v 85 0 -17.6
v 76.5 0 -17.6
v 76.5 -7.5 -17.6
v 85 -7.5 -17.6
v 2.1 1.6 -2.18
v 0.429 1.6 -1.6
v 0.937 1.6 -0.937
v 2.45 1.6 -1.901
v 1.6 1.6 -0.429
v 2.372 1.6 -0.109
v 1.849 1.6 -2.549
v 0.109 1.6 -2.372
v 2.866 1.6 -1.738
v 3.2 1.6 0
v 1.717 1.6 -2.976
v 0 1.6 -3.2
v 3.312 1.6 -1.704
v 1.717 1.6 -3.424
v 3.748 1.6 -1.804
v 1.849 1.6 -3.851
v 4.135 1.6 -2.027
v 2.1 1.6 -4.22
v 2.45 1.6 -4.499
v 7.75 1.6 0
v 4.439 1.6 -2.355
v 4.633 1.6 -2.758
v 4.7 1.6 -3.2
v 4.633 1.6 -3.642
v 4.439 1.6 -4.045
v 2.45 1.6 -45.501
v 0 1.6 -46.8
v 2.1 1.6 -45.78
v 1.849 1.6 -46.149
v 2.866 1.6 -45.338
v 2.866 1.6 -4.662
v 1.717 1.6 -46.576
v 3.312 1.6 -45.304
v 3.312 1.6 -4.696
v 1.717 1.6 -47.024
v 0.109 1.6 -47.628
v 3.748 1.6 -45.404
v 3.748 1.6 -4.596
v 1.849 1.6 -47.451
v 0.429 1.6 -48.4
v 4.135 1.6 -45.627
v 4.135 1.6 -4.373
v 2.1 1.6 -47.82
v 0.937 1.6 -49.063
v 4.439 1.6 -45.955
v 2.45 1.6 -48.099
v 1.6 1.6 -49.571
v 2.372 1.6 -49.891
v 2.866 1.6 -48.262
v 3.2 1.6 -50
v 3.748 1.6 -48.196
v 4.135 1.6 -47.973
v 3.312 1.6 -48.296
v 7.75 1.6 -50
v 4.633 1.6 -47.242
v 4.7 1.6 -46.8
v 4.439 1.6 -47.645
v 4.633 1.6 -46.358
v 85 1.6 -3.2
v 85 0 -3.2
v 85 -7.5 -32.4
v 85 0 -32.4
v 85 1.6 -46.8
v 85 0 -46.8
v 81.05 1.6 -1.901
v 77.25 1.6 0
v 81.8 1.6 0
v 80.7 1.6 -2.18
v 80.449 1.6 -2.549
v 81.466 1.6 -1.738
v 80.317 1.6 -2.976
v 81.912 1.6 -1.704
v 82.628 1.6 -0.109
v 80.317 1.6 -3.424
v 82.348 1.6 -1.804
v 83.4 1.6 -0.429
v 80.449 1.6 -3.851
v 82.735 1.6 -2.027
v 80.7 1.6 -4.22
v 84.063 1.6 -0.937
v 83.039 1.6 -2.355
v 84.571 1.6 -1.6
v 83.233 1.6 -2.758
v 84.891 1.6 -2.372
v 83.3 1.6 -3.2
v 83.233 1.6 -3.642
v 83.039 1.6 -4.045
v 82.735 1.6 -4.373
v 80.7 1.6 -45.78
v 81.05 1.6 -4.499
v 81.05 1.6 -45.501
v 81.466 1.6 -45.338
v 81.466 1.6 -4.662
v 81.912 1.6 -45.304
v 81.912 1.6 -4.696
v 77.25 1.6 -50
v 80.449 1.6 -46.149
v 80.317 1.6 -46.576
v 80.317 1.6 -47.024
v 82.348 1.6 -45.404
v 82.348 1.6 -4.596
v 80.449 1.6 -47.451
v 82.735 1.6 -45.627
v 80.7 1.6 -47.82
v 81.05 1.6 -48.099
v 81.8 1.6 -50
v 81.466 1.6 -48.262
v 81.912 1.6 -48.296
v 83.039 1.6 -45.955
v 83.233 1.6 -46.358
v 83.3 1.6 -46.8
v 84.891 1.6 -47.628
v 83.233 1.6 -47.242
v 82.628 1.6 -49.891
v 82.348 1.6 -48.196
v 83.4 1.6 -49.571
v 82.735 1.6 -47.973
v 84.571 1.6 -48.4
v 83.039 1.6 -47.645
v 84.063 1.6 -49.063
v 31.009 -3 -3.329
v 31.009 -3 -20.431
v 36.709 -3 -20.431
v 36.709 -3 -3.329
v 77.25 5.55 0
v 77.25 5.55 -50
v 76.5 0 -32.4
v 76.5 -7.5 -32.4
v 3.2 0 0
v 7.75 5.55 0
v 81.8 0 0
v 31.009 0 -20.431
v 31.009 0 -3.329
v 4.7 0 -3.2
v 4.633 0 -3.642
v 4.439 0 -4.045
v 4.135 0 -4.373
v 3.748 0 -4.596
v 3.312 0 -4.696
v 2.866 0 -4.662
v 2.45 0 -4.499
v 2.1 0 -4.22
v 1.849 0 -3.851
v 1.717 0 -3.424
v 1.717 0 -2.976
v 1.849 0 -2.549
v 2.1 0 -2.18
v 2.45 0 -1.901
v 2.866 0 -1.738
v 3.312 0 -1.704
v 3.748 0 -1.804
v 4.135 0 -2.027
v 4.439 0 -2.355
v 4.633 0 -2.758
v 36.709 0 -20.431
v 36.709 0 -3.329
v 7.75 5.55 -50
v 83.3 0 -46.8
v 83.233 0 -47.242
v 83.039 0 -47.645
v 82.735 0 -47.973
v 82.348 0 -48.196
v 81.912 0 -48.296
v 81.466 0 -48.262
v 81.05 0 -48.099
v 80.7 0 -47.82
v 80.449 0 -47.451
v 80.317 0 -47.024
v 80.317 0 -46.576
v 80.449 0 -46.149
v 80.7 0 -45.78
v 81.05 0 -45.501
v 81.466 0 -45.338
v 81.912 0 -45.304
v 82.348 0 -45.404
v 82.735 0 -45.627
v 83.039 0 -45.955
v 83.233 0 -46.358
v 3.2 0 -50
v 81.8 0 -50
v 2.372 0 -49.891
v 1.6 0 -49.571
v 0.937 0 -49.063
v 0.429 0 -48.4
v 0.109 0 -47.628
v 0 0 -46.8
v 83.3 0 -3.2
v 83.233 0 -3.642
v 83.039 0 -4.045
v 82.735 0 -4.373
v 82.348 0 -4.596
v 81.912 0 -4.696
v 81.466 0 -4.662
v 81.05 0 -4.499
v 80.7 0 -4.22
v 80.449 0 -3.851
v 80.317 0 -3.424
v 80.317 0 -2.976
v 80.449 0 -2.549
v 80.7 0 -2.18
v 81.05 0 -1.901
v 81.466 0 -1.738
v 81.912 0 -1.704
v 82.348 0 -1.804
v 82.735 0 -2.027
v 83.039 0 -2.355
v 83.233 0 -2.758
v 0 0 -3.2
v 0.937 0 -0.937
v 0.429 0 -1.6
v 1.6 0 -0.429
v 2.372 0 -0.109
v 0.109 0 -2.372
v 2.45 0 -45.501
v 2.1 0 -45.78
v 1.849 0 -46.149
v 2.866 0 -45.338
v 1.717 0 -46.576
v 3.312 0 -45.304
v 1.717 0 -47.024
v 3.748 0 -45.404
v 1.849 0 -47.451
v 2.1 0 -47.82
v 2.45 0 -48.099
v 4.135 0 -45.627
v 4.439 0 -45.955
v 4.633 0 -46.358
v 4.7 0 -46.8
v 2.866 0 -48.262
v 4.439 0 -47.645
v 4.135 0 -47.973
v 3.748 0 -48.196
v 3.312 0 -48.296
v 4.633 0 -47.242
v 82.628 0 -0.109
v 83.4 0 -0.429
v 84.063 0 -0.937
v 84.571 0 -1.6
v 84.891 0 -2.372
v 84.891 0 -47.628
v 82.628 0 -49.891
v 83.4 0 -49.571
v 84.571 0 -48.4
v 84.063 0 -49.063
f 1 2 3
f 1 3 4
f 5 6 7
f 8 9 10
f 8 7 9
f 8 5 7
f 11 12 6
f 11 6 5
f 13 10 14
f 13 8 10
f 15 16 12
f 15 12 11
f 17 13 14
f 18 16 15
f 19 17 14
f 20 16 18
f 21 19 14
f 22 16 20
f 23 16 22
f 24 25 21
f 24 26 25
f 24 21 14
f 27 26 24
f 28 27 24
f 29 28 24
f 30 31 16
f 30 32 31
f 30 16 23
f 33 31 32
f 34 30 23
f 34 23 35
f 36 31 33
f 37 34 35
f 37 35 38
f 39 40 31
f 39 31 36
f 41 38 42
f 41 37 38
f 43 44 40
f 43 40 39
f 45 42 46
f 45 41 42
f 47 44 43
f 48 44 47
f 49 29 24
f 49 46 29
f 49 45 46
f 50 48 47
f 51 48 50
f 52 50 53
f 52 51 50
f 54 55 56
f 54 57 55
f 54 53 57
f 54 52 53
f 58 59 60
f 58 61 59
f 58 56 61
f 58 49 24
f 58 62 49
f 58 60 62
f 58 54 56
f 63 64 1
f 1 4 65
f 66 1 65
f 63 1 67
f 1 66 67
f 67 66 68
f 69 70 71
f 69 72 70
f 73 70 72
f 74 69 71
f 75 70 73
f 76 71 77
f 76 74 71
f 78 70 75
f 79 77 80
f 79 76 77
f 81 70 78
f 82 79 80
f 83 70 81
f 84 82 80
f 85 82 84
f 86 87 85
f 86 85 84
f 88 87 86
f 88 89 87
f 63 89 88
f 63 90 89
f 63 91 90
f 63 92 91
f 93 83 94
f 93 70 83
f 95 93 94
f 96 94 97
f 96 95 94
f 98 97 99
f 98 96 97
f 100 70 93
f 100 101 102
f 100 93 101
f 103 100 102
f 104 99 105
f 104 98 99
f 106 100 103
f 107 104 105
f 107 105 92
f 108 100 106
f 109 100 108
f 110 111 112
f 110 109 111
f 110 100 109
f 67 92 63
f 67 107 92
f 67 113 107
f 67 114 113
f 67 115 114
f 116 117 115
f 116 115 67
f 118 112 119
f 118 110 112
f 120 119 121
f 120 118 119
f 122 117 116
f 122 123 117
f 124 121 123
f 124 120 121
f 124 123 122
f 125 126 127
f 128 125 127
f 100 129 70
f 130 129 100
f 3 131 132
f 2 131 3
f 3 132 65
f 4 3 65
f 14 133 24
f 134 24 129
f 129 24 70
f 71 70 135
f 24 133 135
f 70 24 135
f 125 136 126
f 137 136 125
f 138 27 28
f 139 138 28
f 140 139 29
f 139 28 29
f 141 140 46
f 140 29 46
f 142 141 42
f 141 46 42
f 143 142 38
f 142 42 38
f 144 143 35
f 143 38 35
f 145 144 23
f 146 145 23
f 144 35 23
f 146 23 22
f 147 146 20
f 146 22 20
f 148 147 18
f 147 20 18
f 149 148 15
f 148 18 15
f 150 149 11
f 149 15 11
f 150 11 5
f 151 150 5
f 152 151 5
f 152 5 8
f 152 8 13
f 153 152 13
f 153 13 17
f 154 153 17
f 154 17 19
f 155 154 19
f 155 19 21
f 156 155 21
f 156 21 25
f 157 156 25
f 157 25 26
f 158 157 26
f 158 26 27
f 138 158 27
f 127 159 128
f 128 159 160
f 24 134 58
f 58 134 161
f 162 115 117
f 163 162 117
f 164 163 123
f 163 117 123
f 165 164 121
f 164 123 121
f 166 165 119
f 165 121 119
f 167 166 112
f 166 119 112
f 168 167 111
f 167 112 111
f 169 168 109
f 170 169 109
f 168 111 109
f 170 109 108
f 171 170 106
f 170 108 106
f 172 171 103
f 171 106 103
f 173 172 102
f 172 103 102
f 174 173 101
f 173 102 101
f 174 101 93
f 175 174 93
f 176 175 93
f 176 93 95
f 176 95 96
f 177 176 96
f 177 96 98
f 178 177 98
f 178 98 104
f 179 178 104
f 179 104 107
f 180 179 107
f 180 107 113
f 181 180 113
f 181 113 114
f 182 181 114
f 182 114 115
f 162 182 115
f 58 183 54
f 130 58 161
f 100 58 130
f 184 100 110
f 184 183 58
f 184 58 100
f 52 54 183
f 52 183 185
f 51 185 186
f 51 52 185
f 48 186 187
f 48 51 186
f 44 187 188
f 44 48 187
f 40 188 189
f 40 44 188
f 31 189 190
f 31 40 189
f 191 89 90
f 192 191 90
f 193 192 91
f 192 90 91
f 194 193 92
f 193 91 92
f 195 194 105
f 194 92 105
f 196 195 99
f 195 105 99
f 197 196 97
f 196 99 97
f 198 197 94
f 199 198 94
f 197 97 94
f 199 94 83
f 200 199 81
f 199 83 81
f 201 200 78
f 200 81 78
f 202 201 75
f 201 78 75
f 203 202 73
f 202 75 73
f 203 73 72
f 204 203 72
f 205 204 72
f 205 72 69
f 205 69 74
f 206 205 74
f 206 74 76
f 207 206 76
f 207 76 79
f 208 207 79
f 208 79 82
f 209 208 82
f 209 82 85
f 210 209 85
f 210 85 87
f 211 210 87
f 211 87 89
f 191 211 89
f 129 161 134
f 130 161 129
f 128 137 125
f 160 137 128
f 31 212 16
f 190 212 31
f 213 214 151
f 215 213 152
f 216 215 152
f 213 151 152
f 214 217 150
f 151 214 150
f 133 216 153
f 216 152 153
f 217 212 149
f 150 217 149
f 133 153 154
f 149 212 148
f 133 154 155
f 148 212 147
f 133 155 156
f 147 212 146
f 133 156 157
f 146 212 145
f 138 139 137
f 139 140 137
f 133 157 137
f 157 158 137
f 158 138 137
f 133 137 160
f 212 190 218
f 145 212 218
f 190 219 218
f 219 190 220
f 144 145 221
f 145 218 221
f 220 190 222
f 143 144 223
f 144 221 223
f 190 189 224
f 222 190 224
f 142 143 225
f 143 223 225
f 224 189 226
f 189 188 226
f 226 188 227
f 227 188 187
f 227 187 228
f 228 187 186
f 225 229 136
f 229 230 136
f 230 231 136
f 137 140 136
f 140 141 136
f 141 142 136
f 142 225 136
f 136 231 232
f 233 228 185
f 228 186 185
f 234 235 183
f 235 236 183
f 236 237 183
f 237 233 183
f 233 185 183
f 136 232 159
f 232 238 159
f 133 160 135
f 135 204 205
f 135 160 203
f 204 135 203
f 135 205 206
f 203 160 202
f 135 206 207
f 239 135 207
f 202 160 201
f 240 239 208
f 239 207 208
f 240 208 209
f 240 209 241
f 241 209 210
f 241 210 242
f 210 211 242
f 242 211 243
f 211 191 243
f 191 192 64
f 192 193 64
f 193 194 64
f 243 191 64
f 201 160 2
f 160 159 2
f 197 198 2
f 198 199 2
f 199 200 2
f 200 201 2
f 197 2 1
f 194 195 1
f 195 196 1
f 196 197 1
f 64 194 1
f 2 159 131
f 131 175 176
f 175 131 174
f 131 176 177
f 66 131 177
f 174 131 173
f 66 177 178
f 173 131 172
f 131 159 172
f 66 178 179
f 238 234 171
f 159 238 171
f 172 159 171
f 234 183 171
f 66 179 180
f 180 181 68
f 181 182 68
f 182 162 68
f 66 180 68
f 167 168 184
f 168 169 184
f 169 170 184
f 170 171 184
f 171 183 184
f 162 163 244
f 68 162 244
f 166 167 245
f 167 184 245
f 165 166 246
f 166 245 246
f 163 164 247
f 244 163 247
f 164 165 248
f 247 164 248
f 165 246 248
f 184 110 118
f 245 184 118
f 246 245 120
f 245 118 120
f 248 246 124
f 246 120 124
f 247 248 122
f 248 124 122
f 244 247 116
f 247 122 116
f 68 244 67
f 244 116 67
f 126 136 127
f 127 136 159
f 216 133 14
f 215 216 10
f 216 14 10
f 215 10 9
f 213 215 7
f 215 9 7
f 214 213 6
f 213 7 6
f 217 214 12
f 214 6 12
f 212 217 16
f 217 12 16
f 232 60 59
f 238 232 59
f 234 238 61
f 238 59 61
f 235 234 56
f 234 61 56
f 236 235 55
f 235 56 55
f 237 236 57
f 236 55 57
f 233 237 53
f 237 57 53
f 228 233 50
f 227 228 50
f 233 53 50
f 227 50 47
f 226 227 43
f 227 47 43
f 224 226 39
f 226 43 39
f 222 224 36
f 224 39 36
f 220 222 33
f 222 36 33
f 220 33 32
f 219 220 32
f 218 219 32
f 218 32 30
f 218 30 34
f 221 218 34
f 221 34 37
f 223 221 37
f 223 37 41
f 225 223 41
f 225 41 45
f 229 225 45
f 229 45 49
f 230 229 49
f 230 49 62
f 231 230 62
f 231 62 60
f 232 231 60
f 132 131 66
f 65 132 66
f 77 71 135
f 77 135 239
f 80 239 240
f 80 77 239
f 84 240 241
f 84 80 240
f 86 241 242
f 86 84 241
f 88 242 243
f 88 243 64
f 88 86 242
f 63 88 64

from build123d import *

# Parameters (mm, degrees)
SKETCH1_W           = 85
SKETCH1_H           = 50
BOSS_EXTRUDE1_DEPTH = 5.55
SKETCH2_W           = 7.75
SKETCH2_H           = 50
CUT_EXTRUDE1_DEPTH  = 3.95
SKETCH3_R           = 1.5
CUT_EXTRUDE2_DEPTH  = 2.6
SKETCH4_W           = 5.700401694
SKETCH4_H           = 17.101205084
BOSS_EXTRUDE2_DEPTH = 3
SKETCH5_W           = 8.5
SKETCH5_H           = 14.8
BOSS_EXTRUDE3_DEPTH = 7.5


with BuildPart() as part:
    # Sketch1 → Boss-Extrude1 (new body)
    with BuildSketch(Plane(origin=(0, 0, 0), x_dir=(1, 0, 0), z_dir=(0, 1, 0))):
        with Locations((42.5, 25)):
            Rectangle(SKETCH1_W, SKETCH1_H)
    extrude(amount=BOSS_EXTRUDE1_DEPTH)

    # Sketch2 → Cut-Extrude1 (cut)
    with BuildSketch(Plane(origin=(0, 5.55, 0), x_dir=(1, 0, 0), z_dir=(0, 1, 0))):
        with Locations((3.875, 25)):
            Rectangle(SKETCH2_W, SKETCH2_H)
        with Locations((81.125, 25)):
            Rectangle(SKETCH2_W, SKETCH2_H)
    extrude(amount=-CUT_EXTRUDE1_DEPTH, mode=Mode.SUBTRACT)

    # Sketch3 → Cut-Extrude2 (cut, through all)
    with BuildSketch(Plane(origin=(0, 1.6, 0), x_dir=(1, 0, 0), z_dir=(0, 1, 0))):
        with Locations((3.2, 46.8)):
            Circle(SKETCH3_R)
        with Locations((3.2, 3.2)):
            Circle(SKETCH3_R)
        with Locations((81.8, 3.2)):
            Circle(SKETCH3_R)
        with Locations((81.8, 46.8)):
            Circle(SKETCH3_R)
        with BuildLine():
            Line((0, 46.8), (0, 50))
            Line((0, 50), (3.2, 50))
            ThreePointArc((3.2, 50), (0.9372583, 49.0627417), (0, 46.8))
        make_face()
        with BuildLine():
            Line((0, 0), (3.2, 0))
            ThreePointArc((3.2, 0), (0.9372583, 0.9372583), (0, 3.2))
            Line((0, 3.2), (0, 0))
        make_face()
        with BuildLine():
            Line((85, 3.2), (85, 0))
            Line((85, 0), (81.8, 0))
            ThreePointArc((81.8, 0), (84.0627417, 0.9372583), (85, 3.2))
        make_face()
        with BuildLine():
            Line((85, 50), (81.8, 50))
            ThreePointArc((81.8, 50), (84.0627417, 49.0627417), (85, 46.8))
            Line((85, 46.8), (85, 50))
        make_face()
    extrude(amount=-CUT_EXTRUDE2_DEPTH, mode=Mode.SUBTRACT)

    # Sketch4 → Boss-Extrude2 (add)
    with BuildSketch(Plane.XZ):
        with Locations((33.858914892, -11.880027846)):
            Rectangle(SKETCH4_W, SKETCH4_H)
    extrude(amount=BOSS_EXTRUDE2_DEPTH)

    # Sketch5 → Boss-Extrude3 (add)
    with BuildSketch(Plane.XZ):
        with Locations((80.75, -25)):
            Rectangle(SKETCH5_W, SKETCH5_H)
    extrude(amount=BOSS_EXTRUDE3_DEPTH)


solid = part.part
